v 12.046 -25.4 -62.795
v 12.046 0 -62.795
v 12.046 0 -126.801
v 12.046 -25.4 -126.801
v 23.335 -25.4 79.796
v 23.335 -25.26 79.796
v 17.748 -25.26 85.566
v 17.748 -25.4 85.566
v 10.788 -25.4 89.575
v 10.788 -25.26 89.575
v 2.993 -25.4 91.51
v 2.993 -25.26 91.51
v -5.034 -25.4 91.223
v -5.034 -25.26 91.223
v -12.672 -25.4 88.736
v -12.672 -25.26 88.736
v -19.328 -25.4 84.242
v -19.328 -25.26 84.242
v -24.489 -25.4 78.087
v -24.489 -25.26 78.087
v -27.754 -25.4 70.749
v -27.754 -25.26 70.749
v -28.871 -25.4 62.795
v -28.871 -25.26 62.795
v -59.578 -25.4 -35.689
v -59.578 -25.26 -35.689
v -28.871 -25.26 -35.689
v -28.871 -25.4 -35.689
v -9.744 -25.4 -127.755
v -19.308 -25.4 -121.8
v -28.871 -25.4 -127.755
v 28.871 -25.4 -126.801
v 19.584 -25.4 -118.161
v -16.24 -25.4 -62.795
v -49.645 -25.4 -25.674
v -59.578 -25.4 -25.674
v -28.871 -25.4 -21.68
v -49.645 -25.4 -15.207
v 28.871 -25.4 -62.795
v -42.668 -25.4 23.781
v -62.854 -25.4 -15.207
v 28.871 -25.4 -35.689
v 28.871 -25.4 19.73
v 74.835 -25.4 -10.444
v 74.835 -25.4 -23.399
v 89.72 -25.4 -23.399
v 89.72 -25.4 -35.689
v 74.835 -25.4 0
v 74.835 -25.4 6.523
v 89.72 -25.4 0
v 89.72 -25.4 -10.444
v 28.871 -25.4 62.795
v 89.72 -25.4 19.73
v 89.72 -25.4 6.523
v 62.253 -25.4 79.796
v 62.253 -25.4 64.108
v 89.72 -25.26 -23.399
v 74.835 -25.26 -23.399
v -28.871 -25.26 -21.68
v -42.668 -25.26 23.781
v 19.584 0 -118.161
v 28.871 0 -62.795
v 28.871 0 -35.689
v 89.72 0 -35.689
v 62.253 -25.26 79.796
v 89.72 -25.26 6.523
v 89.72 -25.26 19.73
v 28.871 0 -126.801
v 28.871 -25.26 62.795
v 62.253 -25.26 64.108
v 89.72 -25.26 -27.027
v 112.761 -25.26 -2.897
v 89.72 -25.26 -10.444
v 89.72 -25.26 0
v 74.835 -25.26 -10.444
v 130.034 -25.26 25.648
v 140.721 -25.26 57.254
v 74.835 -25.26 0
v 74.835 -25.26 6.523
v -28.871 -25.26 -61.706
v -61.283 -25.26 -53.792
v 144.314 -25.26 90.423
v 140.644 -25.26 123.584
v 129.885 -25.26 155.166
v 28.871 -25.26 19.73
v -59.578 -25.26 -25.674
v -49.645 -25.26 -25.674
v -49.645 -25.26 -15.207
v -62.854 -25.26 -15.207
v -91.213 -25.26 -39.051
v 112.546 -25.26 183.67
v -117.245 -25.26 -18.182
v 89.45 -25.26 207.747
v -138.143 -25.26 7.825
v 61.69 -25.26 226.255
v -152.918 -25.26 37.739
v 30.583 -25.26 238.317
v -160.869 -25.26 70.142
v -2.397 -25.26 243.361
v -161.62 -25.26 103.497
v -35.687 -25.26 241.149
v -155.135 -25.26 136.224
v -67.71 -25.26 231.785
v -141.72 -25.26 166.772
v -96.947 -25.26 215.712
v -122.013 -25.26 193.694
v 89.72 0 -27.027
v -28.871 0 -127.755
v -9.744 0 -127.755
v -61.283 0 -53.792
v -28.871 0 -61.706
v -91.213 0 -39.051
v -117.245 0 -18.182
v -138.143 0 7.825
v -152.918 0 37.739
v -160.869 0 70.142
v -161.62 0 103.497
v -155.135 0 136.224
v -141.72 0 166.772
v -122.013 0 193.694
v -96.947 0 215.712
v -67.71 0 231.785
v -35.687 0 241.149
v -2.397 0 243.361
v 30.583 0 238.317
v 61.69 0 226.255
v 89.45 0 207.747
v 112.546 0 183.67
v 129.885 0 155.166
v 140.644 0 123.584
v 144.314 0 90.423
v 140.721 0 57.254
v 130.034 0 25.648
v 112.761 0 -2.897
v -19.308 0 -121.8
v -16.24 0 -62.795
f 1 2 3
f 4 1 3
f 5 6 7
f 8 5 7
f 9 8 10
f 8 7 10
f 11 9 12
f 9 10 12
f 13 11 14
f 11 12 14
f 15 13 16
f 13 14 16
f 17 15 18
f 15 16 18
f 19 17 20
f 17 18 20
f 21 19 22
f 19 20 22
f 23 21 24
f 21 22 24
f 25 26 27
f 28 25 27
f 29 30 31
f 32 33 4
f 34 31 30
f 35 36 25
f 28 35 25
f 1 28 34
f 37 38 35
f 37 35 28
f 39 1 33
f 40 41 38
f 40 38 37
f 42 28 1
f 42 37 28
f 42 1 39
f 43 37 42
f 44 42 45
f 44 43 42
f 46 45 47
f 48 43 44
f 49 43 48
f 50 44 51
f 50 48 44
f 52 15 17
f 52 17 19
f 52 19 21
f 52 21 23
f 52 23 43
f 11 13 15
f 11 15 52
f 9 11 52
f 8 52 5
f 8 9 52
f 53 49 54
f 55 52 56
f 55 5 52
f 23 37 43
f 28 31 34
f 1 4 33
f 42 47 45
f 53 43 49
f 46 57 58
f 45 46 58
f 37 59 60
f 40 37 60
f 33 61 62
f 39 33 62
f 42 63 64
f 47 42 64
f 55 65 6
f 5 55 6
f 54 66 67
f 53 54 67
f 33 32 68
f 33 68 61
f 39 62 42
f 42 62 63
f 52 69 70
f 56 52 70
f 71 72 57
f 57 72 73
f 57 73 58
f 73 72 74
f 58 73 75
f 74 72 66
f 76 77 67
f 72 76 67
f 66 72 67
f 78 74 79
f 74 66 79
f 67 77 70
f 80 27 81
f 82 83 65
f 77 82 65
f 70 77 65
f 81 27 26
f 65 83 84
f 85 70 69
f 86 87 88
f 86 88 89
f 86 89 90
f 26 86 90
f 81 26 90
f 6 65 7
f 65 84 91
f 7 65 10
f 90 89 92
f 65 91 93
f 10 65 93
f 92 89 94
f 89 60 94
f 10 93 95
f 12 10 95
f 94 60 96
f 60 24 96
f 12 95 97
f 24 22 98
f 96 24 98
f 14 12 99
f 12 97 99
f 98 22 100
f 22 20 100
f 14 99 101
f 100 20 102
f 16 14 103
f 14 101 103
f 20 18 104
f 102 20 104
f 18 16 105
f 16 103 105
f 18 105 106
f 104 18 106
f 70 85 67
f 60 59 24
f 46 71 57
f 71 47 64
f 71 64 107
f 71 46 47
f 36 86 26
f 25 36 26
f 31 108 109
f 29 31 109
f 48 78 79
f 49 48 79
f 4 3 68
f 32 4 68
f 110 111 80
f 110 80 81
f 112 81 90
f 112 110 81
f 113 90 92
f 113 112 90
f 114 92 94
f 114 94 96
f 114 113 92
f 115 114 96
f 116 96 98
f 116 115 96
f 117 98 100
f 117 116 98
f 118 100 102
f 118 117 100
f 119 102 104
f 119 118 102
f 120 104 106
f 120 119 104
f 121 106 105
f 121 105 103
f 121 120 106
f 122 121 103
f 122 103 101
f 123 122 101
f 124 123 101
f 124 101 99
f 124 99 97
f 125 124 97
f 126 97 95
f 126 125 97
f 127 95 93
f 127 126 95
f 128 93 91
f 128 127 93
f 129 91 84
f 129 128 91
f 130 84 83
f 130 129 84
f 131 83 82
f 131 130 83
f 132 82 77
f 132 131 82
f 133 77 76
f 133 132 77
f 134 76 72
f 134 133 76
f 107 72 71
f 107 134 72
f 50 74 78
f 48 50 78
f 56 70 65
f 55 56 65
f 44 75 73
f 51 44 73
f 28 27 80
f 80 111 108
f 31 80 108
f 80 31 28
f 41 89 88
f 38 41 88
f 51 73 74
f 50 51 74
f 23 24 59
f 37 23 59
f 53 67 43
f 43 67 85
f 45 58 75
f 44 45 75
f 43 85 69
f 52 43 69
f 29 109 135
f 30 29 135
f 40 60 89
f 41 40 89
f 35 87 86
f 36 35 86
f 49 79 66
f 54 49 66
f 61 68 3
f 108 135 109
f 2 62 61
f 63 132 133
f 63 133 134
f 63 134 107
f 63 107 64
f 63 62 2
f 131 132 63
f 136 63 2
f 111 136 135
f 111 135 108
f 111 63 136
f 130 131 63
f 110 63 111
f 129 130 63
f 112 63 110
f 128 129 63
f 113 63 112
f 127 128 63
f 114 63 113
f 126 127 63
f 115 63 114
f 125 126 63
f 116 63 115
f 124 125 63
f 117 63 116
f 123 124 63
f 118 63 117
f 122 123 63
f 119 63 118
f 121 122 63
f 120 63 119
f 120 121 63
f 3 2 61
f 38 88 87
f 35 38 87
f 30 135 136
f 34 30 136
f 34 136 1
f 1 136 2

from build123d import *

# Parameters (mm, degrees)
F1_DEPTH = 25.4
F3_DEPTH = 25.2600312233


with BuildPart() as f1:
    # F0 (on Front) → F1 (new body)
    with BuildSketch(Plane.XZ):
        Polygon((28.8711190224, 19.7296105325), (28.8711190224, 62.7946555614), (-28.8711190224, 62.7946555614), (-28.8711190224, -21.6803327203), (-28.8711190224, -35.6886684895), (28.8711190224, -35.6886684895), align=None)
        with BuildLine():
            Line((-28.8711190224, 62.7946555614), (28.8711190224, 62.7946555614))
            ThreePointArc((28.8711190224, 62.7946555614), (27.4521603023, 71.7344770551), (23.3347622032, 79.7955492593))
            ThreePointArc((23.3347622032, 79.7955492593), (-8.9398214937, 90.2468158638), (-28.8711190224, 62.7946555614))
        make_face()
        with BuildLine():
            ThreePointArc((23.3347622032, 79.7955492593), (27.4521603023, 71.7344770551), (28.8711190224, 62.7946555614))
            Line((28.8711190224, 62.7946555614), (62.2528098973, 64.1079097986))
            Line((62.2528098973, 64.1079097986), (62.2528098973, 79.7955492593))
            Line((62.2528098973, 79.7955492593), (23.3347622032, 79.7955492593))
        make_face()
        Polygon((74.5094120502, 19.7296105325), (28.8711190224, 19.7296105325), (28.8711190224, -35.6886684895), (89.7200107574, -35.6886684895), (89.7200107574, -23.3990810812), (74.8348683119, -23.3990810812), (74.8348683119, -10.4444716126), (89.7200107574, -10.4444716126), (89.7200107574, 0), (74.8348683119, 0), (74.8348683119, 6.5229041502), (89.7200107574, 6.5229041502), (89.7200107574, 19.7296105325), align=None)
        Polygon((-28.8711190224, -35.6886684895), (-28.8711190224, -21.6803327203), (-42.6678210497, 23.781247437), (-62.8544837236, -15.207156539), (-49.6445633471, -15.207156539), (-49.6445633471, -25.6738718599), (-59.5784634352, -25.6738718599), (-59.5784634352, -35.6886684895), align=None)
        Polygon((28.8711190224, -62.7946555614), (28.8711190224, -35.6886684895), (-28.8711190224, -35.6886684895), (-28.8711190224, -62.7946555614), (-16.2400081754, -62.7946555614), (12.0457587764, -62.7946555614), align=None)
        Polygon((19.5835158229, -118.1614845991), (28.8711190224, -62.7946555614), (12.0457587764, -62.7946555614), (12.0457587764, -126.8014013767), (28.8711190224, -126.8014013767), align=None)
        Polygon((-16.2400081754, -62.7946555614), (-28.8711190224, -62.7946555614), (-28.8711190224, -115.8453673124), (-19.3075612187, -121.8000352383), align=None)
        Polygon((-19.3075612187, -121.8000352383), (-28.8711190224, -115.8453673124), (-28.8711190224, -127.7547031641), (-9.7440034151, -127.7547031641), align=None)
    extrude(amount=F1_DEPTH)

    # F2 (on face) → F3 (join)
    with BuildSketch(Plane(origin=(0, 0, 0), x_dir=(-1, 0, 0), z_dir=(0, 1, 0))):
        with BuildLine():
            ThreePointArc((28.8711190224, -61.7056259644), (124.1382439979, -10.8280309146), (162.1938628718, 90.2468158638))
            ThreePointArc((162.1938628718, 90.2468158638), (-55.7393219165, 229.1835266585), (-89.7200107575, -27.0265344717))
            Line((-89.7200107574, -27.0265344717), (-89.7200107574, -23.3990810812))
            Line((-89.7200107574, -23.3990810812), (-74.8348683119, -23.3990810812))
            Line((-74.8348683119, -23.3990810812), (-74.8348683119, -10.4444716126))
            Line((-74.8348683119, -10.4444716126), (-89.7200107574, -10.4444716126))
            Line((-89.7200107574, -10.4444716126), (-89.7200107574, 0))
            Line((-89.7200107574, 0), (-74.8348683119, 0))
            Line((-74.8348683119, 0), (-74.8348683119, 6.5229041502))
            Line((-74.8348683119, 6.5229041502), (-89.7200107574, 6.5229041502))
            Line((-89.7200107574, 6.5229041502), (-89.7200107574, 19.7296105325))
            Line((-89.7200107574, 19.7296105325), (-28.8711190224, 19.7296105325))
            Line((-28.8711190224, 19.7296105325), (-28.8711190224, 62.7946555614))
            Line((-28.8711190224, 62.7946555614), (-62.2528098973, 64.1079097986))
            Line((-62.2528098973, 64.1079097986), (-62.2528098973, 79.7955492593))
            Line((-62.2528098973, 79.7955492593), (-23.3347622032, 79.7955492593))
            ThreePointArc((-23.3347622032, 79.7955492593), (8.9398214937, 90.2468158638), (28.8711190224, 62.7946555614))
            Line((28.8711190224, 62.7946555614), (28.8711190224, -21.6803327203))
            Line((28.8711190224, -21.6803327203), (42.6678210497, 23.781247437))
            Line((42.6678210497, 23.781247437), (62.8544837236, -15.207156539))
            Line((62.8544837236, -15.207156539), (49.6445633471, -15.207156539))
            Line((49.6445633471, -15.207156539), (49.6445633471, -25.6738718599))
            Line((49.6445633471, -25.6738718599), (59.5784634352, -25.6738718599))
            Line((59.5784634352, -25.6738718599), (59.5784634352, -35.6886684895))
            Line((59.5784634352, -35.6886684895), (28.8711190224, -35.6886684895))
            Line((28.8711190224, -35.6886684895), (28.8711190224, -61.7056259644))
        make_face()
    extrude(amount=-F3_DEPTH)


solid = f1.part
